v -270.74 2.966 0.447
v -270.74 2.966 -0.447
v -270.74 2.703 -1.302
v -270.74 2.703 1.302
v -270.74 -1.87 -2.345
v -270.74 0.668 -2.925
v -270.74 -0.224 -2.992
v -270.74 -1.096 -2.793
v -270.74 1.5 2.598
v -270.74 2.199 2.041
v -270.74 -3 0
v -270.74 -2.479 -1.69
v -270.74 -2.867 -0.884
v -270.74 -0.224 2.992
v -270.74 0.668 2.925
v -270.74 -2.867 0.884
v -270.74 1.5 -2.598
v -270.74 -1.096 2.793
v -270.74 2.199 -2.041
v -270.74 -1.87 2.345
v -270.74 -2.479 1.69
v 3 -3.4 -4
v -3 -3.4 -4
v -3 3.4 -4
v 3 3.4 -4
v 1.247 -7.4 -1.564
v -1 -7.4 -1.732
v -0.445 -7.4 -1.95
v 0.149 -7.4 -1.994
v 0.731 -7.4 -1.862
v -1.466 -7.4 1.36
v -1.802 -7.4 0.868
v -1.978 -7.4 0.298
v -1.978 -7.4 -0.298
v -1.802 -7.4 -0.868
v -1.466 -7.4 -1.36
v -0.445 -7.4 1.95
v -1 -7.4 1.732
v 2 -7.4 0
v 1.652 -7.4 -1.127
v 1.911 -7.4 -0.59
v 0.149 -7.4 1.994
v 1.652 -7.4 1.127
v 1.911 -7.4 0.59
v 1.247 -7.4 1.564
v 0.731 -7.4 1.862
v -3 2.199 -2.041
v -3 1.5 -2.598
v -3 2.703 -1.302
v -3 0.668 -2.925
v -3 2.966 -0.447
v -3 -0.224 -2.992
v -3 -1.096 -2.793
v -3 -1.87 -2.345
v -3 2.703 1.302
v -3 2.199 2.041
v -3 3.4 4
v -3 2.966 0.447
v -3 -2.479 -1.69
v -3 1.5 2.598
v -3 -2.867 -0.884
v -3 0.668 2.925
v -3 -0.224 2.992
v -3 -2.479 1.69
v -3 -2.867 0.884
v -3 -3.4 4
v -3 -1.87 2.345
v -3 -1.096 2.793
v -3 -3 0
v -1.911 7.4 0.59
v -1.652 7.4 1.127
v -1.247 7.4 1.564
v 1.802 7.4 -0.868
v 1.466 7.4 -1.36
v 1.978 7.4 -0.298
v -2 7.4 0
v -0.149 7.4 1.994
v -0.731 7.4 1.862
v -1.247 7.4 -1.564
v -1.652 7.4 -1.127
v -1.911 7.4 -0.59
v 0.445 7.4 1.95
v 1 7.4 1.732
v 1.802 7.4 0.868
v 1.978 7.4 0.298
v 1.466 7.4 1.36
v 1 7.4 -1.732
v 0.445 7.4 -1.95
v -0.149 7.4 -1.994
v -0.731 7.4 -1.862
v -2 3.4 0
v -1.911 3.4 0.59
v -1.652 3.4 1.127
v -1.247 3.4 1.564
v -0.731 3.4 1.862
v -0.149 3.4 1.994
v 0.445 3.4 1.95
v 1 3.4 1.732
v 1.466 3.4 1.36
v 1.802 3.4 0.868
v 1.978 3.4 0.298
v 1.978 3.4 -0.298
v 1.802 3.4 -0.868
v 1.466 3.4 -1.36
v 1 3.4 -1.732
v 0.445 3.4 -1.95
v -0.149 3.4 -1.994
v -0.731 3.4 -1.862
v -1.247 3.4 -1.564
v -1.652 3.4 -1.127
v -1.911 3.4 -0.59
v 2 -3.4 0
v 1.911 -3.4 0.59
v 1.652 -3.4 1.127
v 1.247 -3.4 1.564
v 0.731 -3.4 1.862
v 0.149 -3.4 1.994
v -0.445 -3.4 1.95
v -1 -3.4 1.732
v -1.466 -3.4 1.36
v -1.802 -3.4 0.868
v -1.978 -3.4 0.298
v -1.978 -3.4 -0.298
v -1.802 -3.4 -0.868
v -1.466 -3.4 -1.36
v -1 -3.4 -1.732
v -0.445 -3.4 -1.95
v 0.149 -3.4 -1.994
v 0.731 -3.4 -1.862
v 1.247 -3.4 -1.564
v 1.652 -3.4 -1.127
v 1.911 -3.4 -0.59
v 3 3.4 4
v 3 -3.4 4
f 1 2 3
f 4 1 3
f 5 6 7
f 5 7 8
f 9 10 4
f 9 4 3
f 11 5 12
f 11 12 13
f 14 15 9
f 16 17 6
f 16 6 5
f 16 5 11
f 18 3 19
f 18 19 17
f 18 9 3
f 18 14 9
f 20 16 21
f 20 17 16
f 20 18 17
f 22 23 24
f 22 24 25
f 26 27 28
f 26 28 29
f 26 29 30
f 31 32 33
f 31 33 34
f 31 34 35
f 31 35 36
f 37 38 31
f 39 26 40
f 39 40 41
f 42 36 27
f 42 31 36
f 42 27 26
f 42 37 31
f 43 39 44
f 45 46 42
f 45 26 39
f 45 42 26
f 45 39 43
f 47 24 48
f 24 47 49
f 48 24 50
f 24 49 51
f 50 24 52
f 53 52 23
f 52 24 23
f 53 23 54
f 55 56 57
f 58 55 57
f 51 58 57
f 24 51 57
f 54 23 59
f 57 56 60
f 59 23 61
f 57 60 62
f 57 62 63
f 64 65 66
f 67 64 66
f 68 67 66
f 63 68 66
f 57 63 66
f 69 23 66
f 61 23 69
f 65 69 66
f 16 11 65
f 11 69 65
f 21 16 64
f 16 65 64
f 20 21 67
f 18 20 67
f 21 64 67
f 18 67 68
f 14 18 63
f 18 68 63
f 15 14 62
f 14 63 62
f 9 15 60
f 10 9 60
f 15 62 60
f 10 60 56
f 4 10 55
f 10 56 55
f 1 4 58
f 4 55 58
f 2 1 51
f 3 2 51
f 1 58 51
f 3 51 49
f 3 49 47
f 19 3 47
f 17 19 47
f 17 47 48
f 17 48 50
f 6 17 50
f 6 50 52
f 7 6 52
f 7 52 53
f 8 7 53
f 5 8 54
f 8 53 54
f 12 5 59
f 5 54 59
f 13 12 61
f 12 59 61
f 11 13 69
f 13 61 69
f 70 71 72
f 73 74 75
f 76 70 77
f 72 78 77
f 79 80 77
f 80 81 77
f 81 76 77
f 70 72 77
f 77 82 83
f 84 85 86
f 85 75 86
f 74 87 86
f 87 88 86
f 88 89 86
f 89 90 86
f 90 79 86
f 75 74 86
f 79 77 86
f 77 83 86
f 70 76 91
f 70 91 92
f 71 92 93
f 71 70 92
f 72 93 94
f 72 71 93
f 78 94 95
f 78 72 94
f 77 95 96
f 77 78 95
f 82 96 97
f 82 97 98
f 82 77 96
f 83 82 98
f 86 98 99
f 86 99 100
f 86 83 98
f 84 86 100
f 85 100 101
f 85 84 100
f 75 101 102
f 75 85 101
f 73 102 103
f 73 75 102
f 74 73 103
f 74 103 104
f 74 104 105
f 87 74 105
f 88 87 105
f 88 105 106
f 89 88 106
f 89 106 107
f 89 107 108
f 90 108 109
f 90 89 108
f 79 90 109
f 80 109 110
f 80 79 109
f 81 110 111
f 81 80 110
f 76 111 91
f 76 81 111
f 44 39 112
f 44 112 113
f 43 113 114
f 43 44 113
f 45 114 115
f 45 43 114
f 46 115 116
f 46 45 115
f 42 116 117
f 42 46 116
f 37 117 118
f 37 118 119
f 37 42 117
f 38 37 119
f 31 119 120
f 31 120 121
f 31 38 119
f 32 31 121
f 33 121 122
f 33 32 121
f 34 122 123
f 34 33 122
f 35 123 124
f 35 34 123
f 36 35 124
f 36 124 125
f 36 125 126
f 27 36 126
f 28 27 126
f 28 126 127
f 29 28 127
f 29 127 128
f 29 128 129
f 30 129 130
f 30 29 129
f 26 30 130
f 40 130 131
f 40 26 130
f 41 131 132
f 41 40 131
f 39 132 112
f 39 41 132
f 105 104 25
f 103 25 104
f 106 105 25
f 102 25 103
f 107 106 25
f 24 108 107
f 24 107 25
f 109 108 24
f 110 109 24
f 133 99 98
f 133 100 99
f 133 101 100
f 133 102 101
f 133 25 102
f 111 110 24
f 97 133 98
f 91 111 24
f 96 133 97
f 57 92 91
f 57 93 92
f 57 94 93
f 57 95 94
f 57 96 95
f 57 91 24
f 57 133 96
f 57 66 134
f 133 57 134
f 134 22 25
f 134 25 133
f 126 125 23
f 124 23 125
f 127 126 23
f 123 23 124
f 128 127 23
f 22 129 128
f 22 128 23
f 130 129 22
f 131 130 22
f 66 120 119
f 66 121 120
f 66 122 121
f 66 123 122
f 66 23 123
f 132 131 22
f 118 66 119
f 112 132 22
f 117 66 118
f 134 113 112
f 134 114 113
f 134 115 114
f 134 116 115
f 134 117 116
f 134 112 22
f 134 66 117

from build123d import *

# Parameters (mm, degrees)
F0_W     = 6
F0_H     = 8
F1_DEPTH = 7.4
F2_W     = 6
F2_H     = 8
F2_R     = 2
F3_DEPTH = 4
F4_W     = 6
F4_H     = 8
F4_R     = 2
F5_DEPTH = 4
F6_R     = 3
F7_DEPTH = 167.74
F8_R     = 3
F9_DEPTH = 100


with BuildPart() as f1:
    # F0 (on Front) → F1 (new body, symmetric)
    with BuildSketch(Plane.XZ):
        Rectangle(F0_W, F0_H)
    extrude(amount=F1_DEPTH, both=True)

    # F2 (on face) → F3 (cut)
    with BuildSketch(Plane.XZ.offset(7.4)):
        Rectangle(F2_W, F2_H)
        Circle(F2_R, mode=Mode.SUBTRACT)
    extrude(amount=-F3_DEPTH, mode=Mode.SUBTRACT)

    # F4 (on face) → F5 (cut)
    with BuildSketch(Plane(origin=(0, 7.4, 0), x_dir=(-1, 0, 0), z_dir=(0, 1, 0))):
        Rectangle(F4_W, F4_H)
        Circle(F4_R, mode=Mode.SUBTRACT)
    extrude(amount=-F5_DEPTH, mode=Mode.SUBTRACT)

    # F6 (on face) → F7 (join)
    with BuildSketch(Plane(origin=(-3, 0, 0), x_dir=(0, -1, 0), z_dir=(-1, 0, 0))):
        Circle(F6_R)
    extrude(amount=F7_DEPTH)

    # F8 (on face) → F9 (join)
    with BuildSketch(Plane(origin=(-170.74, 0, 0), x_dir=(0, -1, 0), z_dir=(-1, 0, 0))):
        Circle(F8_R)
    extrude(amount=F9_DEPTH)


solid = f1.part
